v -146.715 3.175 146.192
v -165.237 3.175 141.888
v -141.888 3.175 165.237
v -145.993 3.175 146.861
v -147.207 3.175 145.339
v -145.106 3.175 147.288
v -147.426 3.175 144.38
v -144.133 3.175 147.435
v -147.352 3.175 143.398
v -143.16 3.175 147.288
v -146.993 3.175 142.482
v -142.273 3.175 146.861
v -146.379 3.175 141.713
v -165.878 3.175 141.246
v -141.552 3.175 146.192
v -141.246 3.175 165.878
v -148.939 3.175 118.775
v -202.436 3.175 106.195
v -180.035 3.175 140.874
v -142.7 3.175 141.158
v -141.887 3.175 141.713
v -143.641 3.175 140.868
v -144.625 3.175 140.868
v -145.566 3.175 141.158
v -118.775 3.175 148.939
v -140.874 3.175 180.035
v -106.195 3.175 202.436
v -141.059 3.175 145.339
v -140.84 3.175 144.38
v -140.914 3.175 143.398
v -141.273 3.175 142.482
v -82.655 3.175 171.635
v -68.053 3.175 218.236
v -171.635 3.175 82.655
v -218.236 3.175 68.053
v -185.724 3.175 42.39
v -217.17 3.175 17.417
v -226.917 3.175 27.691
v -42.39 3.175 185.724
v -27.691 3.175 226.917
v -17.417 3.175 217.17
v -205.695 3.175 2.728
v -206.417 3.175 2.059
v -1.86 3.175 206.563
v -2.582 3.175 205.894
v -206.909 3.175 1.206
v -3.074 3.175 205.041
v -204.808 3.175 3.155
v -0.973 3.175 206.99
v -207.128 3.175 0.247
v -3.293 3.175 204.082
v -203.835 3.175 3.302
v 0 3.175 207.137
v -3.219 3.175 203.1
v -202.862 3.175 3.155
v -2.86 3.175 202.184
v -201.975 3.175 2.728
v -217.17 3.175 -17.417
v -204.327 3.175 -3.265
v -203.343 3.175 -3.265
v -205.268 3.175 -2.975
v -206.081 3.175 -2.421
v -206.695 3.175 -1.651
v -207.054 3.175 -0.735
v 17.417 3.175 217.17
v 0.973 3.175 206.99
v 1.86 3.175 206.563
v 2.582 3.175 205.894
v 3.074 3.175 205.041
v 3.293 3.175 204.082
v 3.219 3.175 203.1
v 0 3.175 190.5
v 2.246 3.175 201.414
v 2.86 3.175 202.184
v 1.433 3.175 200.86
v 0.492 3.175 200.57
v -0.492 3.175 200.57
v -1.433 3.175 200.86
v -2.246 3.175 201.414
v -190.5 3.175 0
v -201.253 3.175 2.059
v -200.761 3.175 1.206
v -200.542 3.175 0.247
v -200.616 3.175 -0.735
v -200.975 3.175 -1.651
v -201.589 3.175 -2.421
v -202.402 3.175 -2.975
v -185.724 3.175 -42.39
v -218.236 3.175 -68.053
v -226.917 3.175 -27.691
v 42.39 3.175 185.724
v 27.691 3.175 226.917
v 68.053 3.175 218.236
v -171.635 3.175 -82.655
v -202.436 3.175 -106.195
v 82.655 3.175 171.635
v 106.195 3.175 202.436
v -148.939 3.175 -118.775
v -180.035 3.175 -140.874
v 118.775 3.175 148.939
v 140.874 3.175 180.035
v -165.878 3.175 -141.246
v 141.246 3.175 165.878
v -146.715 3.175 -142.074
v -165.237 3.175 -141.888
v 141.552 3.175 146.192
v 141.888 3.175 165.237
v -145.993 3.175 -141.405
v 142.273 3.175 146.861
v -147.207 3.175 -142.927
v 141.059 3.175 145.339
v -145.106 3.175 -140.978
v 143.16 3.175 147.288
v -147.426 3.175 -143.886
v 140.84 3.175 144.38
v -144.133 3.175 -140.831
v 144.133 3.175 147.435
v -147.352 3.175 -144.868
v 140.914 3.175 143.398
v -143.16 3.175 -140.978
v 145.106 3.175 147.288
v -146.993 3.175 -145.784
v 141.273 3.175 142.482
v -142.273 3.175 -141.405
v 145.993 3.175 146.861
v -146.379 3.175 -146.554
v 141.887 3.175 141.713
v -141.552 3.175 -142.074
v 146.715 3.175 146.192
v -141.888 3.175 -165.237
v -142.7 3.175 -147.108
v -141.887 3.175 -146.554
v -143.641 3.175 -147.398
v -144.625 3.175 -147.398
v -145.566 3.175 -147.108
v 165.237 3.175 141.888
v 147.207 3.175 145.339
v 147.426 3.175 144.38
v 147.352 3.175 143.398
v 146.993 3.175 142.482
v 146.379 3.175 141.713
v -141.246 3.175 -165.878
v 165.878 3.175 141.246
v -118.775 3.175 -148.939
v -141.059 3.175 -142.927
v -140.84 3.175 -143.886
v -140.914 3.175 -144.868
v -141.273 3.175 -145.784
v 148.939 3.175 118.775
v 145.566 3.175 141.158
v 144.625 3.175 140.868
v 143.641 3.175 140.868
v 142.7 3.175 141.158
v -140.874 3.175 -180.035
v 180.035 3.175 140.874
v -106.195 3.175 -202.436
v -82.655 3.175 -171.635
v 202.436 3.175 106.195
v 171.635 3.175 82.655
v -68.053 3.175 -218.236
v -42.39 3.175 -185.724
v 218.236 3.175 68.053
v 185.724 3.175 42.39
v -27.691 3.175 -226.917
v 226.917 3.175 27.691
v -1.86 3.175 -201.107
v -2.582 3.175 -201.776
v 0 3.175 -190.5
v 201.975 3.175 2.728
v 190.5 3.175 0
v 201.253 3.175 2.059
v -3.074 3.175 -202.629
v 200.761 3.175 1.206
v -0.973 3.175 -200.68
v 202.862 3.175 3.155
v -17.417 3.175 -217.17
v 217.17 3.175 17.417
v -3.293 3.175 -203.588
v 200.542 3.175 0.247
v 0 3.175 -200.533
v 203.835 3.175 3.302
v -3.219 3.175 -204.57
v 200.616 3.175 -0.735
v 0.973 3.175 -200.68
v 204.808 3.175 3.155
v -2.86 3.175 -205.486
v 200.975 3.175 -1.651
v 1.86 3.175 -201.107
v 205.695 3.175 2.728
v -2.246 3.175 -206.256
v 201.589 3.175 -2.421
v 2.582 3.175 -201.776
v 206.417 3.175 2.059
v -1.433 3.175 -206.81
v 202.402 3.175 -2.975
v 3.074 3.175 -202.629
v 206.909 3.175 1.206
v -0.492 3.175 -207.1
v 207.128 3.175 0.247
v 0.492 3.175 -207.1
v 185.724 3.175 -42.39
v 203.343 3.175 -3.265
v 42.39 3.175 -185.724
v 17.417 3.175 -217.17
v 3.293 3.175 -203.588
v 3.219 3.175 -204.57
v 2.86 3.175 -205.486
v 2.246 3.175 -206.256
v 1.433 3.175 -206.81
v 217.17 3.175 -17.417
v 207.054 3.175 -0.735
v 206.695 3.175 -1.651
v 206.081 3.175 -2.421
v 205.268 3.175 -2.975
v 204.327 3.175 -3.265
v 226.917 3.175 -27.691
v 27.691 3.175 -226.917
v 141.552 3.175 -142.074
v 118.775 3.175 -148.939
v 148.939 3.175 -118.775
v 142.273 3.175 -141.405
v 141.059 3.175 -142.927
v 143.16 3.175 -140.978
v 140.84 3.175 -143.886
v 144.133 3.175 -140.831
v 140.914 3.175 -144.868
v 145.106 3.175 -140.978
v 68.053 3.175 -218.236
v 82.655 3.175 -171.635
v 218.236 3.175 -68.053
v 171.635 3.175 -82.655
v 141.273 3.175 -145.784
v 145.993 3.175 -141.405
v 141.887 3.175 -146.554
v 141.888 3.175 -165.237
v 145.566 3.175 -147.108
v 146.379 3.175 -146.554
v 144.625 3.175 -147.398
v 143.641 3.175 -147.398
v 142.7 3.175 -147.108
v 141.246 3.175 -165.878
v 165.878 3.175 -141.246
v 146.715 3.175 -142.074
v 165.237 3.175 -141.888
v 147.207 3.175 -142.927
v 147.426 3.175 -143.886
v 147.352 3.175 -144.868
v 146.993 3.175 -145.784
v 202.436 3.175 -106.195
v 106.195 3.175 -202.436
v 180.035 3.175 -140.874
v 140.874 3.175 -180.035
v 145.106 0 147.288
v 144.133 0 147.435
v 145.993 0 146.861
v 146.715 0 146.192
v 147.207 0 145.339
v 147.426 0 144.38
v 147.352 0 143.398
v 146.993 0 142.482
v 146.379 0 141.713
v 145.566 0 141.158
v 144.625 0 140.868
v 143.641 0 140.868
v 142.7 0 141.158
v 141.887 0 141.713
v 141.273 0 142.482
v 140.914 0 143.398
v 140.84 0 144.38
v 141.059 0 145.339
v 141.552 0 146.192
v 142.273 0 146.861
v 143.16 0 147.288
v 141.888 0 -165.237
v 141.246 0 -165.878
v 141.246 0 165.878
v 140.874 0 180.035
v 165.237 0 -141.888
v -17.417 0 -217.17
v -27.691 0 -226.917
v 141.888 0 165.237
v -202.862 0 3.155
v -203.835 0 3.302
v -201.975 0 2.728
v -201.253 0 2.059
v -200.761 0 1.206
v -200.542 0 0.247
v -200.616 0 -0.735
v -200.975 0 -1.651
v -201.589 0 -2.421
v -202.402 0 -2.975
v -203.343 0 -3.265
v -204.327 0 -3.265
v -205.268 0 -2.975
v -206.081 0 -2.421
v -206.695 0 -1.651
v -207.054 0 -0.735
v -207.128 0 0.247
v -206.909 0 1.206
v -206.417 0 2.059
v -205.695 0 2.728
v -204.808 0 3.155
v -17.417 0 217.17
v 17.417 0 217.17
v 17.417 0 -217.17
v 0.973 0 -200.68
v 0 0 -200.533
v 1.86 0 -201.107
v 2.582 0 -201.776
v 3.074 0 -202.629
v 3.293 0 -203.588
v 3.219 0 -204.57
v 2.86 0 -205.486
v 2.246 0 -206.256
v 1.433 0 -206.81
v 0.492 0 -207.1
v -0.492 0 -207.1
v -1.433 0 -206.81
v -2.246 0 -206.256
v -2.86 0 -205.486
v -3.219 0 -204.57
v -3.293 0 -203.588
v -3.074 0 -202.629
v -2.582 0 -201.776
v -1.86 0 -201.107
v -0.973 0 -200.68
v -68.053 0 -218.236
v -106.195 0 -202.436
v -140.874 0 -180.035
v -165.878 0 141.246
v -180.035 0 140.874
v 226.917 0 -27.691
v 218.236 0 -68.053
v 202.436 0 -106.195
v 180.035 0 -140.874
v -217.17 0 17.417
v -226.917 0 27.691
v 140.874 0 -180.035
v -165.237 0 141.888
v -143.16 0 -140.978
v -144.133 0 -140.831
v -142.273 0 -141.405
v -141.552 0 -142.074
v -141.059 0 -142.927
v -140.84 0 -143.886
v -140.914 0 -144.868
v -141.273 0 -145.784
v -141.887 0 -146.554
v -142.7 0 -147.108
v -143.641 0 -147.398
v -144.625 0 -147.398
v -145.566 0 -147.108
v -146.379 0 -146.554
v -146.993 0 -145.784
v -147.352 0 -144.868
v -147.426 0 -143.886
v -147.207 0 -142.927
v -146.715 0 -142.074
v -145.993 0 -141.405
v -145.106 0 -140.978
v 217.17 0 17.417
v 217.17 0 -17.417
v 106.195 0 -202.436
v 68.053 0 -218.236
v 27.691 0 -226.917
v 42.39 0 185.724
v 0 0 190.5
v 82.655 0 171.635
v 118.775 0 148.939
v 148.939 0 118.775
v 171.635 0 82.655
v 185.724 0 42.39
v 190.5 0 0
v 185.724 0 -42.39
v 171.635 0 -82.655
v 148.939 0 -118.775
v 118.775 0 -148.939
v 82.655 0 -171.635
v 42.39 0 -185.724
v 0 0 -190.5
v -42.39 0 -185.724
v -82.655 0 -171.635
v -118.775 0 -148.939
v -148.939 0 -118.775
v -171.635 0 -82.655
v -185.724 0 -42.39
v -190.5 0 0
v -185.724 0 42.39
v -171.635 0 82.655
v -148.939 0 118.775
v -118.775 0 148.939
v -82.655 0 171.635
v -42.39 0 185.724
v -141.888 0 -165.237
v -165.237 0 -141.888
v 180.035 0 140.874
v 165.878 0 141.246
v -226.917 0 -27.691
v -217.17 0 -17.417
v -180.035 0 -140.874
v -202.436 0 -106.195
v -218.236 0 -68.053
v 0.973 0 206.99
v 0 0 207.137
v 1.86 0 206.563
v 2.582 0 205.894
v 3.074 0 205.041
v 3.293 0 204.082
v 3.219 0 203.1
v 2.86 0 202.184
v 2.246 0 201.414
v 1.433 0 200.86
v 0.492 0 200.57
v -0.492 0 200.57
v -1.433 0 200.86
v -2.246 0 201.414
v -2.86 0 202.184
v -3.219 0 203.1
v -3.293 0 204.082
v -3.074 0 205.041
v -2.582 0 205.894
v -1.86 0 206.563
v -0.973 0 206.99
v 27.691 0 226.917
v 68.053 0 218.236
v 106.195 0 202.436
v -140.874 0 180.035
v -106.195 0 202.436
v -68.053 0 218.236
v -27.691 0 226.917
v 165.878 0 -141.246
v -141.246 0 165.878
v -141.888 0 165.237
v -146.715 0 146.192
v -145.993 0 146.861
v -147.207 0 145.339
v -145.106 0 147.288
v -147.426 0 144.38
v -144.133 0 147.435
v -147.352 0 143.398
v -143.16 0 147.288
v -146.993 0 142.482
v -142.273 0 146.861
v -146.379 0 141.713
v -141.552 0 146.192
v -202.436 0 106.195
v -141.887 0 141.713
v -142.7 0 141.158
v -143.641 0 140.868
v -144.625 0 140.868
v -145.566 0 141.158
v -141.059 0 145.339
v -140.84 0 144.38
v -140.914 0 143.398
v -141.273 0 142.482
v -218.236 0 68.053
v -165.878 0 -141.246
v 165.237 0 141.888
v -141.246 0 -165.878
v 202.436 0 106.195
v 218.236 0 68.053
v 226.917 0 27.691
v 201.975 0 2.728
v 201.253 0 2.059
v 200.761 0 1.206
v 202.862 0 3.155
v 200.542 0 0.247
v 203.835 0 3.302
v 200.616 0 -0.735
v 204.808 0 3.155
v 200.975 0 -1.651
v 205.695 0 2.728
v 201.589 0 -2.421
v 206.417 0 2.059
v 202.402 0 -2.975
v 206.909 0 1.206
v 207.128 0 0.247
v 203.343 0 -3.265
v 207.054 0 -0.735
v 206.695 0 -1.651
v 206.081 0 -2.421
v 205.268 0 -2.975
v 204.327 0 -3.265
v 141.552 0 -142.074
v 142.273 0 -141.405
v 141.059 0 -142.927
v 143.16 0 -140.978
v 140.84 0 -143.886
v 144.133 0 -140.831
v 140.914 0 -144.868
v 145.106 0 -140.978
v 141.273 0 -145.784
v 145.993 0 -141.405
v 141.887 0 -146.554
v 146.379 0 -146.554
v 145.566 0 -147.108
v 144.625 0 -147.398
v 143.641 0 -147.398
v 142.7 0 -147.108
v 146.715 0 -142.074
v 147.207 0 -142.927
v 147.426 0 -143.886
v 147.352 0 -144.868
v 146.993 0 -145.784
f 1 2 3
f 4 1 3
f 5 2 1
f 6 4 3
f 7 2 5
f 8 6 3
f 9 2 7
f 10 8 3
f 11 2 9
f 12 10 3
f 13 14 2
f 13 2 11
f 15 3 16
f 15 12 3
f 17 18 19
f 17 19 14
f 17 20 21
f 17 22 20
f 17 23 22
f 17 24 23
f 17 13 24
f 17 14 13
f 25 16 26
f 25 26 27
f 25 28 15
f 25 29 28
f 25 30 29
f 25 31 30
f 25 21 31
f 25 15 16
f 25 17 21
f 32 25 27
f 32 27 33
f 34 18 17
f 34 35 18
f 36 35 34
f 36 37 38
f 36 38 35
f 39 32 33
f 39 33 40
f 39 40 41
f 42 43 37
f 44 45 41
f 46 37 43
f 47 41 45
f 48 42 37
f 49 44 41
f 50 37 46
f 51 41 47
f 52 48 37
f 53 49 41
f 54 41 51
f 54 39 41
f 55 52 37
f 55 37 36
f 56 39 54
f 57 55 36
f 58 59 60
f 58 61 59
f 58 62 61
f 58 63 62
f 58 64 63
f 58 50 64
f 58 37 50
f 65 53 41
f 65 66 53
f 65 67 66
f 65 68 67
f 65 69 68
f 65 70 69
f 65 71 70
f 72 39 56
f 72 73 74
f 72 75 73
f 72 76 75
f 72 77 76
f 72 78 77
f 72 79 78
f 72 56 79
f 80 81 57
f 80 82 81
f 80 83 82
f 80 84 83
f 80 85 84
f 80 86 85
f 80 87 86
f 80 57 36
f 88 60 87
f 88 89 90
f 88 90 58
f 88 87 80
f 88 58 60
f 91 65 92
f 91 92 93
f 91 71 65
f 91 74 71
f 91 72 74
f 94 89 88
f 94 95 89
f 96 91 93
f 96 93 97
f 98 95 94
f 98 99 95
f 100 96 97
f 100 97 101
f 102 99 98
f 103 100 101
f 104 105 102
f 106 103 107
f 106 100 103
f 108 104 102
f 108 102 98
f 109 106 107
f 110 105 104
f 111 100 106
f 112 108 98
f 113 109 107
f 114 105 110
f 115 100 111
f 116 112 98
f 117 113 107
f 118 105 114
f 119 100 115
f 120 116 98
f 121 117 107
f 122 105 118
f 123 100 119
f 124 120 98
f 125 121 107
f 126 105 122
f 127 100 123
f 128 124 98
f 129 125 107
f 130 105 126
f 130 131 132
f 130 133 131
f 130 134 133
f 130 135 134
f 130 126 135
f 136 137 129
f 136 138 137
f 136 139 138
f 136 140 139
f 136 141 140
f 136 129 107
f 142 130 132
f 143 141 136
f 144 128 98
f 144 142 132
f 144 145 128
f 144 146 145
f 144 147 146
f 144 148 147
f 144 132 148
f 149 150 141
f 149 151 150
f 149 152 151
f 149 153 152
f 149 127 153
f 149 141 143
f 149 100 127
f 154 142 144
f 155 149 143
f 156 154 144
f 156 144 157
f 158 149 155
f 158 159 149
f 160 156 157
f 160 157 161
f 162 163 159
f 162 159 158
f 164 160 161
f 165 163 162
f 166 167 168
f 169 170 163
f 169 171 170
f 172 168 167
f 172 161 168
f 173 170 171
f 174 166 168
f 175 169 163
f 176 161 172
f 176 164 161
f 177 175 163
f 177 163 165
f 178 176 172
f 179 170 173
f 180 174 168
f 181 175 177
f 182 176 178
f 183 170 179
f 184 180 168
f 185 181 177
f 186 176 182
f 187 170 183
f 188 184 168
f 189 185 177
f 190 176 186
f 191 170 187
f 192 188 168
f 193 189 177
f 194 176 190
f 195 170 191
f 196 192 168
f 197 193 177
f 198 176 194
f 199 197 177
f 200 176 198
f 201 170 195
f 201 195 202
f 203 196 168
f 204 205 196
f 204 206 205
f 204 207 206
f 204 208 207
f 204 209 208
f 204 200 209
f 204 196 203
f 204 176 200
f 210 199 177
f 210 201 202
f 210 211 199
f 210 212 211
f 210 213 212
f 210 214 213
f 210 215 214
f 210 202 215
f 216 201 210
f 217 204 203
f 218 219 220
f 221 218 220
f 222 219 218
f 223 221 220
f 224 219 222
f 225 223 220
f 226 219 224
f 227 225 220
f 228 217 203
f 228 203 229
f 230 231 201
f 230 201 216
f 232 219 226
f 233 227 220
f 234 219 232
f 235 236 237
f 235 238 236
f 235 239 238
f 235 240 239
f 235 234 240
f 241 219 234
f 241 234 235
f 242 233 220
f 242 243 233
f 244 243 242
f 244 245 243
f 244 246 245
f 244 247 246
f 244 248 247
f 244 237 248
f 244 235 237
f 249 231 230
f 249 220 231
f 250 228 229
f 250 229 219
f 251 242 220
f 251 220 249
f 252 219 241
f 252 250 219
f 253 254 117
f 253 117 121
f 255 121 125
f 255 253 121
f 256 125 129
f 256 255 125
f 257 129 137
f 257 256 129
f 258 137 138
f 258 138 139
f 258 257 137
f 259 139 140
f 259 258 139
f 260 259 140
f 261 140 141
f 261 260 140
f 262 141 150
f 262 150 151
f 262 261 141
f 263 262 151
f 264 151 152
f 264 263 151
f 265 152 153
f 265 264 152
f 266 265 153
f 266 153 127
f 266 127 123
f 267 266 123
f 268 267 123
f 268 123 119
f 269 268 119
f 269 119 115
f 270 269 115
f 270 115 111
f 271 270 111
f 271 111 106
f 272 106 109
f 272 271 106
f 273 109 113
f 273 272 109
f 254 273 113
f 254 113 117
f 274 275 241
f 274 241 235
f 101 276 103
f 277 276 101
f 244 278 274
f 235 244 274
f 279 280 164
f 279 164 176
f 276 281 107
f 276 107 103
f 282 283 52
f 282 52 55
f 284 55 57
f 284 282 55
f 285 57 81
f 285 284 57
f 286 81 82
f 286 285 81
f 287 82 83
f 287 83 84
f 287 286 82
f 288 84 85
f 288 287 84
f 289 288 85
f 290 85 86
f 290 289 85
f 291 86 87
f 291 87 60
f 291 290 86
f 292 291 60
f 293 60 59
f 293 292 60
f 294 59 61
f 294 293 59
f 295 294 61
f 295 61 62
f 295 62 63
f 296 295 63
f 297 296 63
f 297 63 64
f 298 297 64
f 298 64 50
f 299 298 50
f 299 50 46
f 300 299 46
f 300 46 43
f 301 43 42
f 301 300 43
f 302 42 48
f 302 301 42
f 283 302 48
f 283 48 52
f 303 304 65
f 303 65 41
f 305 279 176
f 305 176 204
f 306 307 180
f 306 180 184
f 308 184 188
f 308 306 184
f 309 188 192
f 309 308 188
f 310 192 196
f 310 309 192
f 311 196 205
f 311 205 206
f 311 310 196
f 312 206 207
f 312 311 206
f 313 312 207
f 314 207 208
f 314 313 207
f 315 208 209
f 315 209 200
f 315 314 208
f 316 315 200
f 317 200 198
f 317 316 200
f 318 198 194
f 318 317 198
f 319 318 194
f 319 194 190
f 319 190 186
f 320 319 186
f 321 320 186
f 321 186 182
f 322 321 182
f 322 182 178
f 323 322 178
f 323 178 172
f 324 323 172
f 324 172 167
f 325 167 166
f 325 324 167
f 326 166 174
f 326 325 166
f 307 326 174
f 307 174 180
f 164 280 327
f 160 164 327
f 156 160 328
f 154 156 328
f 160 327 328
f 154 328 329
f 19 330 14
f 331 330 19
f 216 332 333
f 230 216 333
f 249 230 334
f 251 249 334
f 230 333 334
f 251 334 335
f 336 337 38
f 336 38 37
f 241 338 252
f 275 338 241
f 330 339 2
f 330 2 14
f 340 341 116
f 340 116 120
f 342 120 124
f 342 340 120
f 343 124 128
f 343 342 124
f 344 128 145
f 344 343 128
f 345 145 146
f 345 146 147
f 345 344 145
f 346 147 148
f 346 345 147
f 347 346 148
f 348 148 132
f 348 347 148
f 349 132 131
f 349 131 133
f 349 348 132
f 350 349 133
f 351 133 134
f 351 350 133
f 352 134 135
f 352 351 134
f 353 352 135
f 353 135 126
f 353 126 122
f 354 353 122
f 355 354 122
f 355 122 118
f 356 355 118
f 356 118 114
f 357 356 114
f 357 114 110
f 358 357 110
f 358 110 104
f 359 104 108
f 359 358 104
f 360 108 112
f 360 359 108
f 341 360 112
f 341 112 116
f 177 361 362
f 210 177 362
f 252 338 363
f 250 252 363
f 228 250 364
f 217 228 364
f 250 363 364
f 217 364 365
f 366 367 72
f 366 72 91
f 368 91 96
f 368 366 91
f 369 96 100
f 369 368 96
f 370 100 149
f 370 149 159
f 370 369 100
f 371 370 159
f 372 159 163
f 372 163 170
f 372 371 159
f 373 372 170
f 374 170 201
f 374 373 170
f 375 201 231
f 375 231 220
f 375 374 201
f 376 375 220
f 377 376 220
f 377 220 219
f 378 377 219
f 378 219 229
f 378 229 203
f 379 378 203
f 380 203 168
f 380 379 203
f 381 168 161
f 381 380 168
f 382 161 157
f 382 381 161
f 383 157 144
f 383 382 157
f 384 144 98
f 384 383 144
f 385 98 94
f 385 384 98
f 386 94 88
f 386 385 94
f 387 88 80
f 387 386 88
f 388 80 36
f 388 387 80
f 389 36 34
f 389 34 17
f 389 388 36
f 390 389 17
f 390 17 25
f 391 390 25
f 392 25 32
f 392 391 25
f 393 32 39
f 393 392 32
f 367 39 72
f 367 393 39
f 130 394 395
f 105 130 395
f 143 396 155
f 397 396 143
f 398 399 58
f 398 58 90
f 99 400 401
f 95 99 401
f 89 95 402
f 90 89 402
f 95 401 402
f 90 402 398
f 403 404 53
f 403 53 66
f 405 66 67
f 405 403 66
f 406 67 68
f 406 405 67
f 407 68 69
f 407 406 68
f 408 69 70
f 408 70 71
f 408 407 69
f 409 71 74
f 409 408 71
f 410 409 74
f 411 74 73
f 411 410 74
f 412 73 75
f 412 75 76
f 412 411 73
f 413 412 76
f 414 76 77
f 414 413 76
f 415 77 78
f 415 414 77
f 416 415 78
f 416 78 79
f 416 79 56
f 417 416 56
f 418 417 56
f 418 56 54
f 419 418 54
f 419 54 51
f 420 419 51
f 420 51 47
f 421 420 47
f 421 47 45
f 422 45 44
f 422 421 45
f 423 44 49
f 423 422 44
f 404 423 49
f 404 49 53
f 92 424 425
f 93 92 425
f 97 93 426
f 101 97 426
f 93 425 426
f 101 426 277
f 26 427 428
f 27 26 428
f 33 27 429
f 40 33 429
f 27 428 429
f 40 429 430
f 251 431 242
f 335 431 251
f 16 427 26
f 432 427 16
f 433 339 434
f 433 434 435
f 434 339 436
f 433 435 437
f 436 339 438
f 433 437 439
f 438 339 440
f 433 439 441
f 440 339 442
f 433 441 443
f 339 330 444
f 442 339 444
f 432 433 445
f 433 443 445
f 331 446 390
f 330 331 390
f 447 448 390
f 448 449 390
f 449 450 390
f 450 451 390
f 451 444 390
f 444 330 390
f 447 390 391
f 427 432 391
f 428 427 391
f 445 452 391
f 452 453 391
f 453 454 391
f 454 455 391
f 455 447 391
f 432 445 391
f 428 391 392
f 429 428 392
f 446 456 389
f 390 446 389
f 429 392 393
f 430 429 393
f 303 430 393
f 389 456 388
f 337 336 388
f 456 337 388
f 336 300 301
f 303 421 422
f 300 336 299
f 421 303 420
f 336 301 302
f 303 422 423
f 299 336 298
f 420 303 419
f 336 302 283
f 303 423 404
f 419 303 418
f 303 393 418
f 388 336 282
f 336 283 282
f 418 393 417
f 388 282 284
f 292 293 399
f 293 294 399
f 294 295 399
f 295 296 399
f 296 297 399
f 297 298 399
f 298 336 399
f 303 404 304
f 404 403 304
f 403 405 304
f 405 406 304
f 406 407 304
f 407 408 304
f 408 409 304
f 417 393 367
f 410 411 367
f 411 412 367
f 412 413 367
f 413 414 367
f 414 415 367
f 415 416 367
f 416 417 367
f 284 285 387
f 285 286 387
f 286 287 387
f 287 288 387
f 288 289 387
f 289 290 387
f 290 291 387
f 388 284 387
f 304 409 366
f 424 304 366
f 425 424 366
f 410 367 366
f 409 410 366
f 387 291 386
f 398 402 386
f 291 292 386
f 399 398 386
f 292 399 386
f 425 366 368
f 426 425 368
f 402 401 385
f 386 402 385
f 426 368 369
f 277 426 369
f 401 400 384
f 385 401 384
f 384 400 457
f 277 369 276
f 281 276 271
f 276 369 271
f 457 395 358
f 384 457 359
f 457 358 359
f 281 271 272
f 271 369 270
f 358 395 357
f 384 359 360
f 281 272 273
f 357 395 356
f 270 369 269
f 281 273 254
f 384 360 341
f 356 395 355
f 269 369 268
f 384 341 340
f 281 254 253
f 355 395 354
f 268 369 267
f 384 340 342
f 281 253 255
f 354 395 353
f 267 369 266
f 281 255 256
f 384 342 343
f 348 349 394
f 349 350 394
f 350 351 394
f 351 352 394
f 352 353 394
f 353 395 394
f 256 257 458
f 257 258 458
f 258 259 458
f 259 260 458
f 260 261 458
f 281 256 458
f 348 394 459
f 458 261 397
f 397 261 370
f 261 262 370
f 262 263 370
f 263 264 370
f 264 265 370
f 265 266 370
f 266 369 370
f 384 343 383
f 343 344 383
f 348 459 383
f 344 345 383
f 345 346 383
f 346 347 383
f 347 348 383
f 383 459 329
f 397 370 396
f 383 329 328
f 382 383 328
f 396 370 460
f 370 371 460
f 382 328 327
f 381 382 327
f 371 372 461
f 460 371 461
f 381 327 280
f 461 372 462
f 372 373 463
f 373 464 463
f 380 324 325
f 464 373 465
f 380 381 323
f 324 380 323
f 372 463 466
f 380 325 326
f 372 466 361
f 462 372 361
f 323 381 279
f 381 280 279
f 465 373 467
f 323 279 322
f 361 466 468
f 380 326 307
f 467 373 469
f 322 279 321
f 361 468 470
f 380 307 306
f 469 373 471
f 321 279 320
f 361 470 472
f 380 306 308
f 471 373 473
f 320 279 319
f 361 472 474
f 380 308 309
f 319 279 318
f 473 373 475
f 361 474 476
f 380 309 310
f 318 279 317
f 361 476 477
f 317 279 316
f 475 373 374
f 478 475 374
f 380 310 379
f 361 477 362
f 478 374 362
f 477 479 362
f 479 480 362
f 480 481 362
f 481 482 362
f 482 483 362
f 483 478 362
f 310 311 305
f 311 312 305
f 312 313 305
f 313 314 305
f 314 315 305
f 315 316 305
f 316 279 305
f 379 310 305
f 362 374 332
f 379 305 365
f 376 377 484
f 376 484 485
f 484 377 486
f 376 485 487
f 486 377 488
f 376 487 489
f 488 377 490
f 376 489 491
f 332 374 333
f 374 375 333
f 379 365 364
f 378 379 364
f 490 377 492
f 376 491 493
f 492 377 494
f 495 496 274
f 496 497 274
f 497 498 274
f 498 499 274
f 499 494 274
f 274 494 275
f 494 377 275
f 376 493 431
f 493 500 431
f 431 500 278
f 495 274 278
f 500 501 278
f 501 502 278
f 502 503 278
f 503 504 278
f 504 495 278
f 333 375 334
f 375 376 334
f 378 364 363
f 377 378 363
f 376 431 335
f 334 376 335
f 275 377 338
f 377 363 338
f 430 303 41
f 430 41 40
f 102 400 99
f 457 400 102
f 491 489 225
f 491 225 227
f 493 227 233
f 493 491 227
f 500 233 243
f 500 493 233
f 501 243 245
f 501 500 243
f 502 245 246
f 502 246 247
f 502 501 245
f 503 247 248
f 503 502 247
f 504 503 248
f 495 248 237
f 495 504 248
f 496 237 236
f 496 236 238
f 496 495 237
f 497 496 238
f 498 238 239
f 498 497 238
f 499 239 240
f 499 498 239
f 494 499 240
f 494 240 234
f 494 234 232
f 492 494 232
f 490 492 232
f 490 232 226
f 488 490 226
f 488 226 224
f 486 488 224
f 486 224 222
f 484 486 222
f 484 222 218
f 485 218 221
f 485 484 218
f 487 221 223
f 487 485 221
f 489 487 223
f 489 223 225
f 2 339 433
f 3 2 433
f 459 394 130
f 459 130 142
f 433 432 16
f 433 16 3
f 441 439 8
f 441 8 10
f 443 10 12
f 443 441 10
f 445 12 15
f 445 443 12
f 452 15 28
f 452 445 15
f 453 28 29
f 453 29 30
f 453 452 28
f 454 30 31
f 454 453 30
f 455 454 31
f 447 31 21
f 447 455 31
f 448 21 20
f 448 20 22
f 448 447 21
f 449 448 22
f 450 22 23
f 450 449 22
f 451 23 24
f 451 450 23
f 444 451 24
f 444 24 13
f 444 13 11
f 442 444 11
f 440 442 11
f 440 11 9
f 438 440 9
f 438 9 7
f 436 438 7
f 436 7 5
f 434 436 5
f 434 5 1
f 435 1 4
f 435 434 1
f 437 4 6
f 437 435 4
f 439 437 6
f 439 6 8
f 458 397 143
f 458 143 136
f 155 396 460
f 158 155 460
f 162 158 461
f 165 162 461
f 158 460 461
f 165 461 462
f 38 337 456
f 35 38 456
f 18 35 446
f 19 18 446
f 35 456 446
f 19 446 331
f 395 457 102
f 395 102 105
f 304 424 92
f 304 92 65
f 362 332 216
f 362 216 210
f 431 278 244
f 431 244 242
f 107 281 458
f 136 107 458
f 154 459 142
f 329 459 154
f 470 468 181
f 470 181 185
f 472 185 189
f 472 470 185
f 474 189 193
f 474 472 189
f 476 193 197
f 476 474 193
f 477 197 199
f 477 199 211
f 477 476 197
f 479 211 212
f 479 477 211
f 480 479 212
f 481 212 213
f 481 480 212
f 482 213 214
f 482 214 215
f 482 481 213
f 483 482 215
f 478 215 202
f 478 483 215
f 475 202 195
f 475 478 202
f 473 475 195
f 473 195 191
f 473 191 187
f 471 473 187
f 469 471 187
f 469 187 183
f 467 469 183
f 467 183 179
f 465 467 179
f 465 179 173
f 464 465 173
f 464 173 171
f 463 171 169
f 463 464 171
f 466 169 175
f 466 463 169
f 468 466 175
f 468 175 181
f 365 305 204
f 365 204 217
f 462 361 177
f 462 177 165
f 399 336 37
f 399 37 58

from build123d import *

# Parameters (mm, degrees)
SKETCH1_R           = 3.302
SKETCH1_R_2         = 190.5
BOSS_EXTRUDE1_DEPTH = 3.175
CHAMFER1_DEPTH      = 3.175


with BuildPart() as part:
    # Sketch1 → Boss-Extrude1 (new body)
    with BuildSketch(Plane(origin=(0, 0, 0), x_dir=(1, 0, 0), z_dir=(0, 1, 0))):
        with BuildLine():
            Line((228.003026076, -16.51), (217.17, -16.51))
            Line((217.17, -16.51), (217.17, 16.51))
            Line((217.17, 16.51), (228.003026076, 16.51))
            ThreePointArc((228.003026076, 16.51), (211.198861132, 87.481432639), (172.896818827, 149.548152912))
            Line((172.896818827, 149.548152912), (165.236712628, 141.888046713))
            Line((165.236712628, 141.888046713), (141.888046713, 165.236712628))
            Line((141.888046713, 165.236712628), (149.548152912, 172.896818827))
            ThreePointArc((149.548152912, 172.896818827), (87.481432639, 211.198861132), (16.51, 228.003026076))
            Line((16.51, 228.003026076), (16.51, 217.17))
            Line((16.51, 217.17), (-16.51, 217.17))
            Line((-16.51, 217.17), (-16.51, 228.003026076))
            ThreePointArc((-16.51, 228.003026076), (-87.481432639, 211.198861132), (-149.548152912, 172.896818827))
            Line((-149.548152912, 172.896818827), (-141.888046713, 165.236712628))
            Line((-141.888046713, 165.236712628), (-165.236712628, 141.888046713))
            Line((-165.236712628, 141.888046713), (-172.896818827, 149.548152912))
            ThreePointArc((-172.896818827, 149.548152912), (-211.198861132, 87.481432639), (-228.003026076, 16.51))
            Line((-228.003026076, 16.51), (-217.17, 16.51))
            Line((-217.17, 16.51), (-217.17, -16.51))
            Line((-217.17, -16.51), (-228.003026076, -16.51))
            ThreePointArc((-228.003026076, -16.51), (-211.198861132, -87.481432639), (-172.896818827, -149.548152912))
            Line((-172.896818827, -149.548152912), (-165.236712628, -141.888046713))
            Line((-165.236712628, -141.888046713), (-141.888046713, -165.236712628))
            Line((-141.888046713, -165.236712628), (-149.548152912, -172.896818827))
            ThreePointArc((-149.548152912, -172.896818827), (-87.481432639, -211.198861132), (-16.51, -228.003026076))
            Line((-16.51, -228.003026076), (-16.51, -217.17))
            Line((-16.51, -217.17), (16.51, -217.17))
            Line((16.51, -217.17), (16.51, -228.003026076))
            ThreePointArc((16.51, -228.003026076), (87.481432639, -211.198861132), (149.548152912, -172.896818827))
            Line((149.548152912, -172.896818827), (141.888046713, -165.236712628))
            Line((141.888046713, -165.236712628), (165.236712628, -141.888046713))
            Line((165.236712628, -141.888046713), (172.896818827, -149.548152912))
            ThreePointArc((172.896818827, -149.548152912), (211.198861132, -87.481432639), (228.003026076, -16.51))
        make_face()
        with Locations(Location((-144.133110743, -144.133110743, 0), (0, 0, 270))):
            Circle(SKETCH1_R, mode=Mode.SUBTRACT)
        with Locations(Location((0, -203.835, 0), (0, 0, 270))):
            Circle(SKETCH1_R, mode=Mode.SUBTRACT)
        with Locations(Location((144.133110743, -144.133110743, 0), (0, 0, 270))):
            Circle(SKETCH1_R, mode=Mode.SUBTRACT)
        with Locations(Location((203.835, 0, 0), (0, 0, 270))):
            Circle(SKETCH1_R, mode=Mode.SUBTRACT)
        with Locations(Location((-203.835, 0, 0), (0, 0, 270))):
            Circle(SKETCH1_R, mode=Mode.SUBTRACT)
        with Locations(Location((-144.133110743, 144.133110743, 0), (0, 0, 270))):
            Circle(SKETCH1_R, mode=Mode.SUBTRACT)
        with Locations(Location((0, 0, 0), (0, 0, 270))):
            Circle(SKETCH1_R_2, mode=Mode.SUBTRACT)
        with Locations(Location((0, 203.835, 0), (0, 0, 270))):
            Circle(SKETCH1_R, mode=Mode.SUBTRACT)
        with Locations(Location((144.133110743, 144.133110743, 0), (0, 0, 270))):
            Circle(SKETCH1_R, mode=Mode.SUBTRACT)
    extrude(amount=BOSS_EXTRUDE1_DEPTH)

    # Chamfer1: read off the stored shape, not the designer's step
    # Chamfer1 outline → Chamfer1 (cut)
    with BuildSketch(Plane(origin=(0, 0, 0), x_dir=(1, 0, 0), z_dir=(0, 1, 0))):
        with BuildLine():
            ThreePointArc((228.003026076, 16.51), (227.528537531, 22.1071167), (226.916669439, 27.690885335))
            Line((226.916669439, 27.690885335), (217.17, 17.417305498))
            Line((217.17, 17.417305498), (217.17, 16.51))
            Line((217.17, 16.51), (228.003026076, 16.51))
        make_face()
        with BuildLine():
            Line((165.878274498, 141.246484842), (180.034728522, 140.873902927))
            ThreePointArc((180.034728522, 140.873902927), (176.519063933, 145.254879671), (172.896818827, 149.548152912))
            Line((172.896818827, 149.548152912), (165.236712628, 141.888046713))
            Line((165.236712628, 141.888046713), (165.878274498, 141.246484842))
        make_face()
        with BuildLine():
            Line((228.003026076, -16.51), (217.17, -16.51))
            Line((217.17, -16.51), (217.17, -17.417305498))
            Line((217.17, -17.417305498), (226.916669439, -27.690885335))
            ThreePointArc((226.916669439, -27.690885335), (227.528537531, -22.1071167), (228.003026076, -16.51))
        make_face()
        with BuildLine():
            Line((141.246484842, 165.878274498), (141.888046712, 165.236712627))
            Line((141.888046712, 165.236712627), (149.548152912, 172.896818827))
            ThreePointArc((149.548152912, 172.896818827), (145.254879671, 176.519063933), (140.873902927, 180.034728522))
            Line((140.873902927, 180.034728522), (141.246484842, 165.878274498))
        make_face()
        with BuildLine():
            ThreePointArc((172.896818827, -149.548152912), (176.519063933, -145.254879671), (180.034728522, -140.873902927))
            Line((180.034728522, -140.873902927), (165.878274498, -141.246484842))
            Line((165.878274498, -141.246484842), (165.236712627, -141.888046712))
            Line((165.236712627, -141.888046712), (172.896818827, -149.548152912))
        make_face()
        with BuildLine():
            Line((17.417305498, 217.17), (27.690885335, 226.916669439))
            ThreePointArc((27.690885335, 226.916669439), (22.1071167, 227.528537531), (16.51, 228.003026076))
            Line((16.51, 228.003026076), (16.51, 217.17))
            Line((16.51, 217.17), (17.417305498, 217.17))
        make_face()
        with BuildLine():
            Line((149.548152912, -172.896818827), (141.888046713, -165.236712628))
            Line((141.888046713, -165.236712628), (141.246484842, -165.878274498))
            Line((141.246484842, -165.878274498), (140.873902927, -180.034728522))
            ThreePointArc((140.873902927, -180.034728522), (145.254879671, -176.519063933), (149.548152912, -172.896818827))
        make_face()
        with BuildLine():
            Line((-17.417305498, 217.17), (-16.51, 217.17))
            Line((-16.51, 217.17), (-16.51, 228.003026076))
            ThreePointArc((-16.51, 228.003026076), (-22.1071167, 227.528537531), (-27.690885335, 226.916669439))
            Line((-27.690885335, 226.916669439), (-17.417305498, 217.17))
        make_face()
        with BuildLine():
            ThreePointArc((16.51, -228.003026076), (22.1071167, -227.528537531), (27.690885335, -226.916669439))
            Line((27.690885335, -226.916669439), (17.417305498, -217.17))
            Line((17.417305498, -217.17), (16.51, -217.17))
            Line((16.51, -217.17), (16.51, -228.003026076))
        make_face()
        with BuildLine():
            Line((-141.246484842, 165.878274498), (-140.873902927, 180.034728522))
            ThreePointArc((-140.873902927, 180.034728522), (-145.254879671, 176.519063933), (-149.548152912, 172.896818827))
            Line((-149.548152912, 172.896818827), (-141.888046713, 165.236712628))
            Line((-141.888046713, 165.236712628), (-141.246484842, 165.878274498))
        make_face()
        with BuildLine():
            Line((-16.51, -228.003026076), (-16.51, -217.17))
            Line((-16.51, -217.17), (-17.417305498, -217.17))
            Line((-17.417305498, -217.17), (-27.690885335, -226.916669439))
            ThreePointArc((-27.690885335, -226.916669439), (-22.1071167, -227.528537531), (-16.51, -228.003026076))
        make_face()
        with BuildLine():
            Line((-165.878274498, 141.246484842), (-165.236712627, 141.888046712))
            Line((-165.236712627, 141.888046712), (-172.896818827, 149.548152912))
            ThreePointArc((-172.896818827, 149.548152912), (-176.519063933, 145.254879671), (-180.034728522, 140.873902927))
            Line((-180.034728522, 140.873902927), (-165.878274498, 141.246484842))
        make_face()
        with BuildLine():
            ThreePointArc((-149.548152912, -172.896818827), (-145.254879671, -176.519063933), (-140.873902927, -180.034728522))
            Line((-140.873902927, -180.034728522), (-141.246484842, -165.878274498))
            Line((-141.246484842, -165.878274498), (-141.888046712, -165.236712627))
            Line((-141.888046712, -165.236712627), (-149.548152912, -172.896818827))
        make_face()
        with BuildLine():
            Line((-217.17, 17.417305498), (-226.916669439, 27.690885335))
            ThreePointArc((-226.916669439, 27.690885335), (-227.528537531, 22.1071167), (-228.003026076, 16.51))
            Line((-228.003026076, 16.51), (-217.17, 16.51))
            Line((-217.17, 16.51), (-217.17, 17.417305498))
        make_face()
        with BuildLine():
            Line((-172.896818827, -149.548152912), (-165.236712628, -141.888046713))
            Line((-165.236712628, -141.888046713), (-165.878274498, -141.246484842))
            Line((-165.878274498, -141.246484842), (-180.034728522, -140.873902927))
            ThreePointArc((-180.034728522, -140.873902927), (-176.519063933, -145.254879671), (-172.896818827, -149.548152912))
        make_face()
        with BuildLine():
            Line((-217.17, -17.417305498), (-217.17, -16.51))
            Line((-217.17, -16.51), (-228.003026076, -16.51))
            ThreePointArc((-228.003026076, -16.51), (-227.528537531, -22.1071167), (-226.916669439, -27.690885335))
            Line((-226.916669439, -27.690885335), (-217.17, -17.417305498))
        make_face()
    extrude(amount=CHAMFER1_DEPTH, mode=Mode.SUBTRACT)


solid = part.part
